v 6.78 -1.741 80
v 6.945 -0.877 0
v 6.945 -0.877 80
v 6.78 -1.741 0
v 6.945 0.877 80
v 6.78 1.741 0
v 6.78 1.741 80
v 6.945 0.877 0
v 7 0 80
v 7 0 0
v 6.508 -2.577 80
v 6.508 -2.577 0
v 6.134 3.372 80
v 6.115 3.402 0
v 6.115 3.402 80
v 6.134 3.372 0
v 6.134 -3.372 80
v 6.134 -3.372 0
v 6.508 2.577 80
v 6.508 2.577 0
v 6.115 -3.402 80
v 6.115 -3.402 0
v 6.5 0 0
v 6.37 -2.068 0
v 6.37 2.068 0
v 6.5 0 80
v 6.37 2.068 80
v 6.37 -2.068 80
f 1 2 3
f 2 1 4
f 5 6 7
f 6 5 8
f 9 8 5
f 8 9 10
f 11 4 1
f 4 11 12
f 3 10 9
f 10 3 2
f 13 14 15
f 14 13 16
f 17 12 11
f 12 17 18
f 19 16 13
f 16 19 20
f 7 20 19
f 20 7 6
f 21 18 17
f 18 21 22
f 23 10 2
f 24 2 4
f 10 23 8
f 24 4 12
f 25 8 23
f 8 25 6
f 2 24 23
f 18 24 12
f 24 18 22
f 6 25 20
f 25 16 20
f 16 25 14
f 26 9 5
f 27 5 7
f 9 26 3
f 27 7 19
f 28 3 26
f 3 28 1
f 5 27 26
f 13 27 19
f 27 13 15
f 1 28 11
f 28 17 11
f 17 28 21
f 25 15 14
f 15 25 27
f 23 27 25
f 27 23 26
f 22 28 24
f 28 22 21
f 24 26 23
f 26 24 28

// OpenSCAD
$fn = 50;


difference() {
	union() {
		cylinder(h = 80, r = 7.0000000000);
		translate(v = [-13.0000000000, 0, 0]) {
			cylinder(h = 80, r = 7.0000000000);
		}
	}
	union() {
		cylinder(h = 80, r = 3.2500000000);
		cylinder(h = 80, r = 1.8000000000);
		cylinder(h = 80, r = 1.8000000000);
		cylinder(h = 80, r = 1.8000000000);
		translate(v = [-17.5000000000, 0, 0]) {
			hull() {
				translate(v = [-3.7500000000, 0.0000000000, 0]) {
					cylinder(h = 80, r = 10.5000000000);
				}
				translate(v = [3.7500000000, 0.0000000000, 0]) {
					cylinder(h = 80, r = 10.5000000000);
				}
				translate(v = [-3.7500000000, -0.0000000000, 0]) {
					cylinder(h = 80, r = 10.5000000000);
				}
				translate(v = [3.7500000000, -0.0000000000, 0]) {
					cylinder(h = 80, r = 10.5000000000);
				}
			}
		}
		translate(v = [-10.0000000000, 0, 0.0000000000]) {
			cylinder(h = 80, r = 16.5000000000);
		}
	}
}
